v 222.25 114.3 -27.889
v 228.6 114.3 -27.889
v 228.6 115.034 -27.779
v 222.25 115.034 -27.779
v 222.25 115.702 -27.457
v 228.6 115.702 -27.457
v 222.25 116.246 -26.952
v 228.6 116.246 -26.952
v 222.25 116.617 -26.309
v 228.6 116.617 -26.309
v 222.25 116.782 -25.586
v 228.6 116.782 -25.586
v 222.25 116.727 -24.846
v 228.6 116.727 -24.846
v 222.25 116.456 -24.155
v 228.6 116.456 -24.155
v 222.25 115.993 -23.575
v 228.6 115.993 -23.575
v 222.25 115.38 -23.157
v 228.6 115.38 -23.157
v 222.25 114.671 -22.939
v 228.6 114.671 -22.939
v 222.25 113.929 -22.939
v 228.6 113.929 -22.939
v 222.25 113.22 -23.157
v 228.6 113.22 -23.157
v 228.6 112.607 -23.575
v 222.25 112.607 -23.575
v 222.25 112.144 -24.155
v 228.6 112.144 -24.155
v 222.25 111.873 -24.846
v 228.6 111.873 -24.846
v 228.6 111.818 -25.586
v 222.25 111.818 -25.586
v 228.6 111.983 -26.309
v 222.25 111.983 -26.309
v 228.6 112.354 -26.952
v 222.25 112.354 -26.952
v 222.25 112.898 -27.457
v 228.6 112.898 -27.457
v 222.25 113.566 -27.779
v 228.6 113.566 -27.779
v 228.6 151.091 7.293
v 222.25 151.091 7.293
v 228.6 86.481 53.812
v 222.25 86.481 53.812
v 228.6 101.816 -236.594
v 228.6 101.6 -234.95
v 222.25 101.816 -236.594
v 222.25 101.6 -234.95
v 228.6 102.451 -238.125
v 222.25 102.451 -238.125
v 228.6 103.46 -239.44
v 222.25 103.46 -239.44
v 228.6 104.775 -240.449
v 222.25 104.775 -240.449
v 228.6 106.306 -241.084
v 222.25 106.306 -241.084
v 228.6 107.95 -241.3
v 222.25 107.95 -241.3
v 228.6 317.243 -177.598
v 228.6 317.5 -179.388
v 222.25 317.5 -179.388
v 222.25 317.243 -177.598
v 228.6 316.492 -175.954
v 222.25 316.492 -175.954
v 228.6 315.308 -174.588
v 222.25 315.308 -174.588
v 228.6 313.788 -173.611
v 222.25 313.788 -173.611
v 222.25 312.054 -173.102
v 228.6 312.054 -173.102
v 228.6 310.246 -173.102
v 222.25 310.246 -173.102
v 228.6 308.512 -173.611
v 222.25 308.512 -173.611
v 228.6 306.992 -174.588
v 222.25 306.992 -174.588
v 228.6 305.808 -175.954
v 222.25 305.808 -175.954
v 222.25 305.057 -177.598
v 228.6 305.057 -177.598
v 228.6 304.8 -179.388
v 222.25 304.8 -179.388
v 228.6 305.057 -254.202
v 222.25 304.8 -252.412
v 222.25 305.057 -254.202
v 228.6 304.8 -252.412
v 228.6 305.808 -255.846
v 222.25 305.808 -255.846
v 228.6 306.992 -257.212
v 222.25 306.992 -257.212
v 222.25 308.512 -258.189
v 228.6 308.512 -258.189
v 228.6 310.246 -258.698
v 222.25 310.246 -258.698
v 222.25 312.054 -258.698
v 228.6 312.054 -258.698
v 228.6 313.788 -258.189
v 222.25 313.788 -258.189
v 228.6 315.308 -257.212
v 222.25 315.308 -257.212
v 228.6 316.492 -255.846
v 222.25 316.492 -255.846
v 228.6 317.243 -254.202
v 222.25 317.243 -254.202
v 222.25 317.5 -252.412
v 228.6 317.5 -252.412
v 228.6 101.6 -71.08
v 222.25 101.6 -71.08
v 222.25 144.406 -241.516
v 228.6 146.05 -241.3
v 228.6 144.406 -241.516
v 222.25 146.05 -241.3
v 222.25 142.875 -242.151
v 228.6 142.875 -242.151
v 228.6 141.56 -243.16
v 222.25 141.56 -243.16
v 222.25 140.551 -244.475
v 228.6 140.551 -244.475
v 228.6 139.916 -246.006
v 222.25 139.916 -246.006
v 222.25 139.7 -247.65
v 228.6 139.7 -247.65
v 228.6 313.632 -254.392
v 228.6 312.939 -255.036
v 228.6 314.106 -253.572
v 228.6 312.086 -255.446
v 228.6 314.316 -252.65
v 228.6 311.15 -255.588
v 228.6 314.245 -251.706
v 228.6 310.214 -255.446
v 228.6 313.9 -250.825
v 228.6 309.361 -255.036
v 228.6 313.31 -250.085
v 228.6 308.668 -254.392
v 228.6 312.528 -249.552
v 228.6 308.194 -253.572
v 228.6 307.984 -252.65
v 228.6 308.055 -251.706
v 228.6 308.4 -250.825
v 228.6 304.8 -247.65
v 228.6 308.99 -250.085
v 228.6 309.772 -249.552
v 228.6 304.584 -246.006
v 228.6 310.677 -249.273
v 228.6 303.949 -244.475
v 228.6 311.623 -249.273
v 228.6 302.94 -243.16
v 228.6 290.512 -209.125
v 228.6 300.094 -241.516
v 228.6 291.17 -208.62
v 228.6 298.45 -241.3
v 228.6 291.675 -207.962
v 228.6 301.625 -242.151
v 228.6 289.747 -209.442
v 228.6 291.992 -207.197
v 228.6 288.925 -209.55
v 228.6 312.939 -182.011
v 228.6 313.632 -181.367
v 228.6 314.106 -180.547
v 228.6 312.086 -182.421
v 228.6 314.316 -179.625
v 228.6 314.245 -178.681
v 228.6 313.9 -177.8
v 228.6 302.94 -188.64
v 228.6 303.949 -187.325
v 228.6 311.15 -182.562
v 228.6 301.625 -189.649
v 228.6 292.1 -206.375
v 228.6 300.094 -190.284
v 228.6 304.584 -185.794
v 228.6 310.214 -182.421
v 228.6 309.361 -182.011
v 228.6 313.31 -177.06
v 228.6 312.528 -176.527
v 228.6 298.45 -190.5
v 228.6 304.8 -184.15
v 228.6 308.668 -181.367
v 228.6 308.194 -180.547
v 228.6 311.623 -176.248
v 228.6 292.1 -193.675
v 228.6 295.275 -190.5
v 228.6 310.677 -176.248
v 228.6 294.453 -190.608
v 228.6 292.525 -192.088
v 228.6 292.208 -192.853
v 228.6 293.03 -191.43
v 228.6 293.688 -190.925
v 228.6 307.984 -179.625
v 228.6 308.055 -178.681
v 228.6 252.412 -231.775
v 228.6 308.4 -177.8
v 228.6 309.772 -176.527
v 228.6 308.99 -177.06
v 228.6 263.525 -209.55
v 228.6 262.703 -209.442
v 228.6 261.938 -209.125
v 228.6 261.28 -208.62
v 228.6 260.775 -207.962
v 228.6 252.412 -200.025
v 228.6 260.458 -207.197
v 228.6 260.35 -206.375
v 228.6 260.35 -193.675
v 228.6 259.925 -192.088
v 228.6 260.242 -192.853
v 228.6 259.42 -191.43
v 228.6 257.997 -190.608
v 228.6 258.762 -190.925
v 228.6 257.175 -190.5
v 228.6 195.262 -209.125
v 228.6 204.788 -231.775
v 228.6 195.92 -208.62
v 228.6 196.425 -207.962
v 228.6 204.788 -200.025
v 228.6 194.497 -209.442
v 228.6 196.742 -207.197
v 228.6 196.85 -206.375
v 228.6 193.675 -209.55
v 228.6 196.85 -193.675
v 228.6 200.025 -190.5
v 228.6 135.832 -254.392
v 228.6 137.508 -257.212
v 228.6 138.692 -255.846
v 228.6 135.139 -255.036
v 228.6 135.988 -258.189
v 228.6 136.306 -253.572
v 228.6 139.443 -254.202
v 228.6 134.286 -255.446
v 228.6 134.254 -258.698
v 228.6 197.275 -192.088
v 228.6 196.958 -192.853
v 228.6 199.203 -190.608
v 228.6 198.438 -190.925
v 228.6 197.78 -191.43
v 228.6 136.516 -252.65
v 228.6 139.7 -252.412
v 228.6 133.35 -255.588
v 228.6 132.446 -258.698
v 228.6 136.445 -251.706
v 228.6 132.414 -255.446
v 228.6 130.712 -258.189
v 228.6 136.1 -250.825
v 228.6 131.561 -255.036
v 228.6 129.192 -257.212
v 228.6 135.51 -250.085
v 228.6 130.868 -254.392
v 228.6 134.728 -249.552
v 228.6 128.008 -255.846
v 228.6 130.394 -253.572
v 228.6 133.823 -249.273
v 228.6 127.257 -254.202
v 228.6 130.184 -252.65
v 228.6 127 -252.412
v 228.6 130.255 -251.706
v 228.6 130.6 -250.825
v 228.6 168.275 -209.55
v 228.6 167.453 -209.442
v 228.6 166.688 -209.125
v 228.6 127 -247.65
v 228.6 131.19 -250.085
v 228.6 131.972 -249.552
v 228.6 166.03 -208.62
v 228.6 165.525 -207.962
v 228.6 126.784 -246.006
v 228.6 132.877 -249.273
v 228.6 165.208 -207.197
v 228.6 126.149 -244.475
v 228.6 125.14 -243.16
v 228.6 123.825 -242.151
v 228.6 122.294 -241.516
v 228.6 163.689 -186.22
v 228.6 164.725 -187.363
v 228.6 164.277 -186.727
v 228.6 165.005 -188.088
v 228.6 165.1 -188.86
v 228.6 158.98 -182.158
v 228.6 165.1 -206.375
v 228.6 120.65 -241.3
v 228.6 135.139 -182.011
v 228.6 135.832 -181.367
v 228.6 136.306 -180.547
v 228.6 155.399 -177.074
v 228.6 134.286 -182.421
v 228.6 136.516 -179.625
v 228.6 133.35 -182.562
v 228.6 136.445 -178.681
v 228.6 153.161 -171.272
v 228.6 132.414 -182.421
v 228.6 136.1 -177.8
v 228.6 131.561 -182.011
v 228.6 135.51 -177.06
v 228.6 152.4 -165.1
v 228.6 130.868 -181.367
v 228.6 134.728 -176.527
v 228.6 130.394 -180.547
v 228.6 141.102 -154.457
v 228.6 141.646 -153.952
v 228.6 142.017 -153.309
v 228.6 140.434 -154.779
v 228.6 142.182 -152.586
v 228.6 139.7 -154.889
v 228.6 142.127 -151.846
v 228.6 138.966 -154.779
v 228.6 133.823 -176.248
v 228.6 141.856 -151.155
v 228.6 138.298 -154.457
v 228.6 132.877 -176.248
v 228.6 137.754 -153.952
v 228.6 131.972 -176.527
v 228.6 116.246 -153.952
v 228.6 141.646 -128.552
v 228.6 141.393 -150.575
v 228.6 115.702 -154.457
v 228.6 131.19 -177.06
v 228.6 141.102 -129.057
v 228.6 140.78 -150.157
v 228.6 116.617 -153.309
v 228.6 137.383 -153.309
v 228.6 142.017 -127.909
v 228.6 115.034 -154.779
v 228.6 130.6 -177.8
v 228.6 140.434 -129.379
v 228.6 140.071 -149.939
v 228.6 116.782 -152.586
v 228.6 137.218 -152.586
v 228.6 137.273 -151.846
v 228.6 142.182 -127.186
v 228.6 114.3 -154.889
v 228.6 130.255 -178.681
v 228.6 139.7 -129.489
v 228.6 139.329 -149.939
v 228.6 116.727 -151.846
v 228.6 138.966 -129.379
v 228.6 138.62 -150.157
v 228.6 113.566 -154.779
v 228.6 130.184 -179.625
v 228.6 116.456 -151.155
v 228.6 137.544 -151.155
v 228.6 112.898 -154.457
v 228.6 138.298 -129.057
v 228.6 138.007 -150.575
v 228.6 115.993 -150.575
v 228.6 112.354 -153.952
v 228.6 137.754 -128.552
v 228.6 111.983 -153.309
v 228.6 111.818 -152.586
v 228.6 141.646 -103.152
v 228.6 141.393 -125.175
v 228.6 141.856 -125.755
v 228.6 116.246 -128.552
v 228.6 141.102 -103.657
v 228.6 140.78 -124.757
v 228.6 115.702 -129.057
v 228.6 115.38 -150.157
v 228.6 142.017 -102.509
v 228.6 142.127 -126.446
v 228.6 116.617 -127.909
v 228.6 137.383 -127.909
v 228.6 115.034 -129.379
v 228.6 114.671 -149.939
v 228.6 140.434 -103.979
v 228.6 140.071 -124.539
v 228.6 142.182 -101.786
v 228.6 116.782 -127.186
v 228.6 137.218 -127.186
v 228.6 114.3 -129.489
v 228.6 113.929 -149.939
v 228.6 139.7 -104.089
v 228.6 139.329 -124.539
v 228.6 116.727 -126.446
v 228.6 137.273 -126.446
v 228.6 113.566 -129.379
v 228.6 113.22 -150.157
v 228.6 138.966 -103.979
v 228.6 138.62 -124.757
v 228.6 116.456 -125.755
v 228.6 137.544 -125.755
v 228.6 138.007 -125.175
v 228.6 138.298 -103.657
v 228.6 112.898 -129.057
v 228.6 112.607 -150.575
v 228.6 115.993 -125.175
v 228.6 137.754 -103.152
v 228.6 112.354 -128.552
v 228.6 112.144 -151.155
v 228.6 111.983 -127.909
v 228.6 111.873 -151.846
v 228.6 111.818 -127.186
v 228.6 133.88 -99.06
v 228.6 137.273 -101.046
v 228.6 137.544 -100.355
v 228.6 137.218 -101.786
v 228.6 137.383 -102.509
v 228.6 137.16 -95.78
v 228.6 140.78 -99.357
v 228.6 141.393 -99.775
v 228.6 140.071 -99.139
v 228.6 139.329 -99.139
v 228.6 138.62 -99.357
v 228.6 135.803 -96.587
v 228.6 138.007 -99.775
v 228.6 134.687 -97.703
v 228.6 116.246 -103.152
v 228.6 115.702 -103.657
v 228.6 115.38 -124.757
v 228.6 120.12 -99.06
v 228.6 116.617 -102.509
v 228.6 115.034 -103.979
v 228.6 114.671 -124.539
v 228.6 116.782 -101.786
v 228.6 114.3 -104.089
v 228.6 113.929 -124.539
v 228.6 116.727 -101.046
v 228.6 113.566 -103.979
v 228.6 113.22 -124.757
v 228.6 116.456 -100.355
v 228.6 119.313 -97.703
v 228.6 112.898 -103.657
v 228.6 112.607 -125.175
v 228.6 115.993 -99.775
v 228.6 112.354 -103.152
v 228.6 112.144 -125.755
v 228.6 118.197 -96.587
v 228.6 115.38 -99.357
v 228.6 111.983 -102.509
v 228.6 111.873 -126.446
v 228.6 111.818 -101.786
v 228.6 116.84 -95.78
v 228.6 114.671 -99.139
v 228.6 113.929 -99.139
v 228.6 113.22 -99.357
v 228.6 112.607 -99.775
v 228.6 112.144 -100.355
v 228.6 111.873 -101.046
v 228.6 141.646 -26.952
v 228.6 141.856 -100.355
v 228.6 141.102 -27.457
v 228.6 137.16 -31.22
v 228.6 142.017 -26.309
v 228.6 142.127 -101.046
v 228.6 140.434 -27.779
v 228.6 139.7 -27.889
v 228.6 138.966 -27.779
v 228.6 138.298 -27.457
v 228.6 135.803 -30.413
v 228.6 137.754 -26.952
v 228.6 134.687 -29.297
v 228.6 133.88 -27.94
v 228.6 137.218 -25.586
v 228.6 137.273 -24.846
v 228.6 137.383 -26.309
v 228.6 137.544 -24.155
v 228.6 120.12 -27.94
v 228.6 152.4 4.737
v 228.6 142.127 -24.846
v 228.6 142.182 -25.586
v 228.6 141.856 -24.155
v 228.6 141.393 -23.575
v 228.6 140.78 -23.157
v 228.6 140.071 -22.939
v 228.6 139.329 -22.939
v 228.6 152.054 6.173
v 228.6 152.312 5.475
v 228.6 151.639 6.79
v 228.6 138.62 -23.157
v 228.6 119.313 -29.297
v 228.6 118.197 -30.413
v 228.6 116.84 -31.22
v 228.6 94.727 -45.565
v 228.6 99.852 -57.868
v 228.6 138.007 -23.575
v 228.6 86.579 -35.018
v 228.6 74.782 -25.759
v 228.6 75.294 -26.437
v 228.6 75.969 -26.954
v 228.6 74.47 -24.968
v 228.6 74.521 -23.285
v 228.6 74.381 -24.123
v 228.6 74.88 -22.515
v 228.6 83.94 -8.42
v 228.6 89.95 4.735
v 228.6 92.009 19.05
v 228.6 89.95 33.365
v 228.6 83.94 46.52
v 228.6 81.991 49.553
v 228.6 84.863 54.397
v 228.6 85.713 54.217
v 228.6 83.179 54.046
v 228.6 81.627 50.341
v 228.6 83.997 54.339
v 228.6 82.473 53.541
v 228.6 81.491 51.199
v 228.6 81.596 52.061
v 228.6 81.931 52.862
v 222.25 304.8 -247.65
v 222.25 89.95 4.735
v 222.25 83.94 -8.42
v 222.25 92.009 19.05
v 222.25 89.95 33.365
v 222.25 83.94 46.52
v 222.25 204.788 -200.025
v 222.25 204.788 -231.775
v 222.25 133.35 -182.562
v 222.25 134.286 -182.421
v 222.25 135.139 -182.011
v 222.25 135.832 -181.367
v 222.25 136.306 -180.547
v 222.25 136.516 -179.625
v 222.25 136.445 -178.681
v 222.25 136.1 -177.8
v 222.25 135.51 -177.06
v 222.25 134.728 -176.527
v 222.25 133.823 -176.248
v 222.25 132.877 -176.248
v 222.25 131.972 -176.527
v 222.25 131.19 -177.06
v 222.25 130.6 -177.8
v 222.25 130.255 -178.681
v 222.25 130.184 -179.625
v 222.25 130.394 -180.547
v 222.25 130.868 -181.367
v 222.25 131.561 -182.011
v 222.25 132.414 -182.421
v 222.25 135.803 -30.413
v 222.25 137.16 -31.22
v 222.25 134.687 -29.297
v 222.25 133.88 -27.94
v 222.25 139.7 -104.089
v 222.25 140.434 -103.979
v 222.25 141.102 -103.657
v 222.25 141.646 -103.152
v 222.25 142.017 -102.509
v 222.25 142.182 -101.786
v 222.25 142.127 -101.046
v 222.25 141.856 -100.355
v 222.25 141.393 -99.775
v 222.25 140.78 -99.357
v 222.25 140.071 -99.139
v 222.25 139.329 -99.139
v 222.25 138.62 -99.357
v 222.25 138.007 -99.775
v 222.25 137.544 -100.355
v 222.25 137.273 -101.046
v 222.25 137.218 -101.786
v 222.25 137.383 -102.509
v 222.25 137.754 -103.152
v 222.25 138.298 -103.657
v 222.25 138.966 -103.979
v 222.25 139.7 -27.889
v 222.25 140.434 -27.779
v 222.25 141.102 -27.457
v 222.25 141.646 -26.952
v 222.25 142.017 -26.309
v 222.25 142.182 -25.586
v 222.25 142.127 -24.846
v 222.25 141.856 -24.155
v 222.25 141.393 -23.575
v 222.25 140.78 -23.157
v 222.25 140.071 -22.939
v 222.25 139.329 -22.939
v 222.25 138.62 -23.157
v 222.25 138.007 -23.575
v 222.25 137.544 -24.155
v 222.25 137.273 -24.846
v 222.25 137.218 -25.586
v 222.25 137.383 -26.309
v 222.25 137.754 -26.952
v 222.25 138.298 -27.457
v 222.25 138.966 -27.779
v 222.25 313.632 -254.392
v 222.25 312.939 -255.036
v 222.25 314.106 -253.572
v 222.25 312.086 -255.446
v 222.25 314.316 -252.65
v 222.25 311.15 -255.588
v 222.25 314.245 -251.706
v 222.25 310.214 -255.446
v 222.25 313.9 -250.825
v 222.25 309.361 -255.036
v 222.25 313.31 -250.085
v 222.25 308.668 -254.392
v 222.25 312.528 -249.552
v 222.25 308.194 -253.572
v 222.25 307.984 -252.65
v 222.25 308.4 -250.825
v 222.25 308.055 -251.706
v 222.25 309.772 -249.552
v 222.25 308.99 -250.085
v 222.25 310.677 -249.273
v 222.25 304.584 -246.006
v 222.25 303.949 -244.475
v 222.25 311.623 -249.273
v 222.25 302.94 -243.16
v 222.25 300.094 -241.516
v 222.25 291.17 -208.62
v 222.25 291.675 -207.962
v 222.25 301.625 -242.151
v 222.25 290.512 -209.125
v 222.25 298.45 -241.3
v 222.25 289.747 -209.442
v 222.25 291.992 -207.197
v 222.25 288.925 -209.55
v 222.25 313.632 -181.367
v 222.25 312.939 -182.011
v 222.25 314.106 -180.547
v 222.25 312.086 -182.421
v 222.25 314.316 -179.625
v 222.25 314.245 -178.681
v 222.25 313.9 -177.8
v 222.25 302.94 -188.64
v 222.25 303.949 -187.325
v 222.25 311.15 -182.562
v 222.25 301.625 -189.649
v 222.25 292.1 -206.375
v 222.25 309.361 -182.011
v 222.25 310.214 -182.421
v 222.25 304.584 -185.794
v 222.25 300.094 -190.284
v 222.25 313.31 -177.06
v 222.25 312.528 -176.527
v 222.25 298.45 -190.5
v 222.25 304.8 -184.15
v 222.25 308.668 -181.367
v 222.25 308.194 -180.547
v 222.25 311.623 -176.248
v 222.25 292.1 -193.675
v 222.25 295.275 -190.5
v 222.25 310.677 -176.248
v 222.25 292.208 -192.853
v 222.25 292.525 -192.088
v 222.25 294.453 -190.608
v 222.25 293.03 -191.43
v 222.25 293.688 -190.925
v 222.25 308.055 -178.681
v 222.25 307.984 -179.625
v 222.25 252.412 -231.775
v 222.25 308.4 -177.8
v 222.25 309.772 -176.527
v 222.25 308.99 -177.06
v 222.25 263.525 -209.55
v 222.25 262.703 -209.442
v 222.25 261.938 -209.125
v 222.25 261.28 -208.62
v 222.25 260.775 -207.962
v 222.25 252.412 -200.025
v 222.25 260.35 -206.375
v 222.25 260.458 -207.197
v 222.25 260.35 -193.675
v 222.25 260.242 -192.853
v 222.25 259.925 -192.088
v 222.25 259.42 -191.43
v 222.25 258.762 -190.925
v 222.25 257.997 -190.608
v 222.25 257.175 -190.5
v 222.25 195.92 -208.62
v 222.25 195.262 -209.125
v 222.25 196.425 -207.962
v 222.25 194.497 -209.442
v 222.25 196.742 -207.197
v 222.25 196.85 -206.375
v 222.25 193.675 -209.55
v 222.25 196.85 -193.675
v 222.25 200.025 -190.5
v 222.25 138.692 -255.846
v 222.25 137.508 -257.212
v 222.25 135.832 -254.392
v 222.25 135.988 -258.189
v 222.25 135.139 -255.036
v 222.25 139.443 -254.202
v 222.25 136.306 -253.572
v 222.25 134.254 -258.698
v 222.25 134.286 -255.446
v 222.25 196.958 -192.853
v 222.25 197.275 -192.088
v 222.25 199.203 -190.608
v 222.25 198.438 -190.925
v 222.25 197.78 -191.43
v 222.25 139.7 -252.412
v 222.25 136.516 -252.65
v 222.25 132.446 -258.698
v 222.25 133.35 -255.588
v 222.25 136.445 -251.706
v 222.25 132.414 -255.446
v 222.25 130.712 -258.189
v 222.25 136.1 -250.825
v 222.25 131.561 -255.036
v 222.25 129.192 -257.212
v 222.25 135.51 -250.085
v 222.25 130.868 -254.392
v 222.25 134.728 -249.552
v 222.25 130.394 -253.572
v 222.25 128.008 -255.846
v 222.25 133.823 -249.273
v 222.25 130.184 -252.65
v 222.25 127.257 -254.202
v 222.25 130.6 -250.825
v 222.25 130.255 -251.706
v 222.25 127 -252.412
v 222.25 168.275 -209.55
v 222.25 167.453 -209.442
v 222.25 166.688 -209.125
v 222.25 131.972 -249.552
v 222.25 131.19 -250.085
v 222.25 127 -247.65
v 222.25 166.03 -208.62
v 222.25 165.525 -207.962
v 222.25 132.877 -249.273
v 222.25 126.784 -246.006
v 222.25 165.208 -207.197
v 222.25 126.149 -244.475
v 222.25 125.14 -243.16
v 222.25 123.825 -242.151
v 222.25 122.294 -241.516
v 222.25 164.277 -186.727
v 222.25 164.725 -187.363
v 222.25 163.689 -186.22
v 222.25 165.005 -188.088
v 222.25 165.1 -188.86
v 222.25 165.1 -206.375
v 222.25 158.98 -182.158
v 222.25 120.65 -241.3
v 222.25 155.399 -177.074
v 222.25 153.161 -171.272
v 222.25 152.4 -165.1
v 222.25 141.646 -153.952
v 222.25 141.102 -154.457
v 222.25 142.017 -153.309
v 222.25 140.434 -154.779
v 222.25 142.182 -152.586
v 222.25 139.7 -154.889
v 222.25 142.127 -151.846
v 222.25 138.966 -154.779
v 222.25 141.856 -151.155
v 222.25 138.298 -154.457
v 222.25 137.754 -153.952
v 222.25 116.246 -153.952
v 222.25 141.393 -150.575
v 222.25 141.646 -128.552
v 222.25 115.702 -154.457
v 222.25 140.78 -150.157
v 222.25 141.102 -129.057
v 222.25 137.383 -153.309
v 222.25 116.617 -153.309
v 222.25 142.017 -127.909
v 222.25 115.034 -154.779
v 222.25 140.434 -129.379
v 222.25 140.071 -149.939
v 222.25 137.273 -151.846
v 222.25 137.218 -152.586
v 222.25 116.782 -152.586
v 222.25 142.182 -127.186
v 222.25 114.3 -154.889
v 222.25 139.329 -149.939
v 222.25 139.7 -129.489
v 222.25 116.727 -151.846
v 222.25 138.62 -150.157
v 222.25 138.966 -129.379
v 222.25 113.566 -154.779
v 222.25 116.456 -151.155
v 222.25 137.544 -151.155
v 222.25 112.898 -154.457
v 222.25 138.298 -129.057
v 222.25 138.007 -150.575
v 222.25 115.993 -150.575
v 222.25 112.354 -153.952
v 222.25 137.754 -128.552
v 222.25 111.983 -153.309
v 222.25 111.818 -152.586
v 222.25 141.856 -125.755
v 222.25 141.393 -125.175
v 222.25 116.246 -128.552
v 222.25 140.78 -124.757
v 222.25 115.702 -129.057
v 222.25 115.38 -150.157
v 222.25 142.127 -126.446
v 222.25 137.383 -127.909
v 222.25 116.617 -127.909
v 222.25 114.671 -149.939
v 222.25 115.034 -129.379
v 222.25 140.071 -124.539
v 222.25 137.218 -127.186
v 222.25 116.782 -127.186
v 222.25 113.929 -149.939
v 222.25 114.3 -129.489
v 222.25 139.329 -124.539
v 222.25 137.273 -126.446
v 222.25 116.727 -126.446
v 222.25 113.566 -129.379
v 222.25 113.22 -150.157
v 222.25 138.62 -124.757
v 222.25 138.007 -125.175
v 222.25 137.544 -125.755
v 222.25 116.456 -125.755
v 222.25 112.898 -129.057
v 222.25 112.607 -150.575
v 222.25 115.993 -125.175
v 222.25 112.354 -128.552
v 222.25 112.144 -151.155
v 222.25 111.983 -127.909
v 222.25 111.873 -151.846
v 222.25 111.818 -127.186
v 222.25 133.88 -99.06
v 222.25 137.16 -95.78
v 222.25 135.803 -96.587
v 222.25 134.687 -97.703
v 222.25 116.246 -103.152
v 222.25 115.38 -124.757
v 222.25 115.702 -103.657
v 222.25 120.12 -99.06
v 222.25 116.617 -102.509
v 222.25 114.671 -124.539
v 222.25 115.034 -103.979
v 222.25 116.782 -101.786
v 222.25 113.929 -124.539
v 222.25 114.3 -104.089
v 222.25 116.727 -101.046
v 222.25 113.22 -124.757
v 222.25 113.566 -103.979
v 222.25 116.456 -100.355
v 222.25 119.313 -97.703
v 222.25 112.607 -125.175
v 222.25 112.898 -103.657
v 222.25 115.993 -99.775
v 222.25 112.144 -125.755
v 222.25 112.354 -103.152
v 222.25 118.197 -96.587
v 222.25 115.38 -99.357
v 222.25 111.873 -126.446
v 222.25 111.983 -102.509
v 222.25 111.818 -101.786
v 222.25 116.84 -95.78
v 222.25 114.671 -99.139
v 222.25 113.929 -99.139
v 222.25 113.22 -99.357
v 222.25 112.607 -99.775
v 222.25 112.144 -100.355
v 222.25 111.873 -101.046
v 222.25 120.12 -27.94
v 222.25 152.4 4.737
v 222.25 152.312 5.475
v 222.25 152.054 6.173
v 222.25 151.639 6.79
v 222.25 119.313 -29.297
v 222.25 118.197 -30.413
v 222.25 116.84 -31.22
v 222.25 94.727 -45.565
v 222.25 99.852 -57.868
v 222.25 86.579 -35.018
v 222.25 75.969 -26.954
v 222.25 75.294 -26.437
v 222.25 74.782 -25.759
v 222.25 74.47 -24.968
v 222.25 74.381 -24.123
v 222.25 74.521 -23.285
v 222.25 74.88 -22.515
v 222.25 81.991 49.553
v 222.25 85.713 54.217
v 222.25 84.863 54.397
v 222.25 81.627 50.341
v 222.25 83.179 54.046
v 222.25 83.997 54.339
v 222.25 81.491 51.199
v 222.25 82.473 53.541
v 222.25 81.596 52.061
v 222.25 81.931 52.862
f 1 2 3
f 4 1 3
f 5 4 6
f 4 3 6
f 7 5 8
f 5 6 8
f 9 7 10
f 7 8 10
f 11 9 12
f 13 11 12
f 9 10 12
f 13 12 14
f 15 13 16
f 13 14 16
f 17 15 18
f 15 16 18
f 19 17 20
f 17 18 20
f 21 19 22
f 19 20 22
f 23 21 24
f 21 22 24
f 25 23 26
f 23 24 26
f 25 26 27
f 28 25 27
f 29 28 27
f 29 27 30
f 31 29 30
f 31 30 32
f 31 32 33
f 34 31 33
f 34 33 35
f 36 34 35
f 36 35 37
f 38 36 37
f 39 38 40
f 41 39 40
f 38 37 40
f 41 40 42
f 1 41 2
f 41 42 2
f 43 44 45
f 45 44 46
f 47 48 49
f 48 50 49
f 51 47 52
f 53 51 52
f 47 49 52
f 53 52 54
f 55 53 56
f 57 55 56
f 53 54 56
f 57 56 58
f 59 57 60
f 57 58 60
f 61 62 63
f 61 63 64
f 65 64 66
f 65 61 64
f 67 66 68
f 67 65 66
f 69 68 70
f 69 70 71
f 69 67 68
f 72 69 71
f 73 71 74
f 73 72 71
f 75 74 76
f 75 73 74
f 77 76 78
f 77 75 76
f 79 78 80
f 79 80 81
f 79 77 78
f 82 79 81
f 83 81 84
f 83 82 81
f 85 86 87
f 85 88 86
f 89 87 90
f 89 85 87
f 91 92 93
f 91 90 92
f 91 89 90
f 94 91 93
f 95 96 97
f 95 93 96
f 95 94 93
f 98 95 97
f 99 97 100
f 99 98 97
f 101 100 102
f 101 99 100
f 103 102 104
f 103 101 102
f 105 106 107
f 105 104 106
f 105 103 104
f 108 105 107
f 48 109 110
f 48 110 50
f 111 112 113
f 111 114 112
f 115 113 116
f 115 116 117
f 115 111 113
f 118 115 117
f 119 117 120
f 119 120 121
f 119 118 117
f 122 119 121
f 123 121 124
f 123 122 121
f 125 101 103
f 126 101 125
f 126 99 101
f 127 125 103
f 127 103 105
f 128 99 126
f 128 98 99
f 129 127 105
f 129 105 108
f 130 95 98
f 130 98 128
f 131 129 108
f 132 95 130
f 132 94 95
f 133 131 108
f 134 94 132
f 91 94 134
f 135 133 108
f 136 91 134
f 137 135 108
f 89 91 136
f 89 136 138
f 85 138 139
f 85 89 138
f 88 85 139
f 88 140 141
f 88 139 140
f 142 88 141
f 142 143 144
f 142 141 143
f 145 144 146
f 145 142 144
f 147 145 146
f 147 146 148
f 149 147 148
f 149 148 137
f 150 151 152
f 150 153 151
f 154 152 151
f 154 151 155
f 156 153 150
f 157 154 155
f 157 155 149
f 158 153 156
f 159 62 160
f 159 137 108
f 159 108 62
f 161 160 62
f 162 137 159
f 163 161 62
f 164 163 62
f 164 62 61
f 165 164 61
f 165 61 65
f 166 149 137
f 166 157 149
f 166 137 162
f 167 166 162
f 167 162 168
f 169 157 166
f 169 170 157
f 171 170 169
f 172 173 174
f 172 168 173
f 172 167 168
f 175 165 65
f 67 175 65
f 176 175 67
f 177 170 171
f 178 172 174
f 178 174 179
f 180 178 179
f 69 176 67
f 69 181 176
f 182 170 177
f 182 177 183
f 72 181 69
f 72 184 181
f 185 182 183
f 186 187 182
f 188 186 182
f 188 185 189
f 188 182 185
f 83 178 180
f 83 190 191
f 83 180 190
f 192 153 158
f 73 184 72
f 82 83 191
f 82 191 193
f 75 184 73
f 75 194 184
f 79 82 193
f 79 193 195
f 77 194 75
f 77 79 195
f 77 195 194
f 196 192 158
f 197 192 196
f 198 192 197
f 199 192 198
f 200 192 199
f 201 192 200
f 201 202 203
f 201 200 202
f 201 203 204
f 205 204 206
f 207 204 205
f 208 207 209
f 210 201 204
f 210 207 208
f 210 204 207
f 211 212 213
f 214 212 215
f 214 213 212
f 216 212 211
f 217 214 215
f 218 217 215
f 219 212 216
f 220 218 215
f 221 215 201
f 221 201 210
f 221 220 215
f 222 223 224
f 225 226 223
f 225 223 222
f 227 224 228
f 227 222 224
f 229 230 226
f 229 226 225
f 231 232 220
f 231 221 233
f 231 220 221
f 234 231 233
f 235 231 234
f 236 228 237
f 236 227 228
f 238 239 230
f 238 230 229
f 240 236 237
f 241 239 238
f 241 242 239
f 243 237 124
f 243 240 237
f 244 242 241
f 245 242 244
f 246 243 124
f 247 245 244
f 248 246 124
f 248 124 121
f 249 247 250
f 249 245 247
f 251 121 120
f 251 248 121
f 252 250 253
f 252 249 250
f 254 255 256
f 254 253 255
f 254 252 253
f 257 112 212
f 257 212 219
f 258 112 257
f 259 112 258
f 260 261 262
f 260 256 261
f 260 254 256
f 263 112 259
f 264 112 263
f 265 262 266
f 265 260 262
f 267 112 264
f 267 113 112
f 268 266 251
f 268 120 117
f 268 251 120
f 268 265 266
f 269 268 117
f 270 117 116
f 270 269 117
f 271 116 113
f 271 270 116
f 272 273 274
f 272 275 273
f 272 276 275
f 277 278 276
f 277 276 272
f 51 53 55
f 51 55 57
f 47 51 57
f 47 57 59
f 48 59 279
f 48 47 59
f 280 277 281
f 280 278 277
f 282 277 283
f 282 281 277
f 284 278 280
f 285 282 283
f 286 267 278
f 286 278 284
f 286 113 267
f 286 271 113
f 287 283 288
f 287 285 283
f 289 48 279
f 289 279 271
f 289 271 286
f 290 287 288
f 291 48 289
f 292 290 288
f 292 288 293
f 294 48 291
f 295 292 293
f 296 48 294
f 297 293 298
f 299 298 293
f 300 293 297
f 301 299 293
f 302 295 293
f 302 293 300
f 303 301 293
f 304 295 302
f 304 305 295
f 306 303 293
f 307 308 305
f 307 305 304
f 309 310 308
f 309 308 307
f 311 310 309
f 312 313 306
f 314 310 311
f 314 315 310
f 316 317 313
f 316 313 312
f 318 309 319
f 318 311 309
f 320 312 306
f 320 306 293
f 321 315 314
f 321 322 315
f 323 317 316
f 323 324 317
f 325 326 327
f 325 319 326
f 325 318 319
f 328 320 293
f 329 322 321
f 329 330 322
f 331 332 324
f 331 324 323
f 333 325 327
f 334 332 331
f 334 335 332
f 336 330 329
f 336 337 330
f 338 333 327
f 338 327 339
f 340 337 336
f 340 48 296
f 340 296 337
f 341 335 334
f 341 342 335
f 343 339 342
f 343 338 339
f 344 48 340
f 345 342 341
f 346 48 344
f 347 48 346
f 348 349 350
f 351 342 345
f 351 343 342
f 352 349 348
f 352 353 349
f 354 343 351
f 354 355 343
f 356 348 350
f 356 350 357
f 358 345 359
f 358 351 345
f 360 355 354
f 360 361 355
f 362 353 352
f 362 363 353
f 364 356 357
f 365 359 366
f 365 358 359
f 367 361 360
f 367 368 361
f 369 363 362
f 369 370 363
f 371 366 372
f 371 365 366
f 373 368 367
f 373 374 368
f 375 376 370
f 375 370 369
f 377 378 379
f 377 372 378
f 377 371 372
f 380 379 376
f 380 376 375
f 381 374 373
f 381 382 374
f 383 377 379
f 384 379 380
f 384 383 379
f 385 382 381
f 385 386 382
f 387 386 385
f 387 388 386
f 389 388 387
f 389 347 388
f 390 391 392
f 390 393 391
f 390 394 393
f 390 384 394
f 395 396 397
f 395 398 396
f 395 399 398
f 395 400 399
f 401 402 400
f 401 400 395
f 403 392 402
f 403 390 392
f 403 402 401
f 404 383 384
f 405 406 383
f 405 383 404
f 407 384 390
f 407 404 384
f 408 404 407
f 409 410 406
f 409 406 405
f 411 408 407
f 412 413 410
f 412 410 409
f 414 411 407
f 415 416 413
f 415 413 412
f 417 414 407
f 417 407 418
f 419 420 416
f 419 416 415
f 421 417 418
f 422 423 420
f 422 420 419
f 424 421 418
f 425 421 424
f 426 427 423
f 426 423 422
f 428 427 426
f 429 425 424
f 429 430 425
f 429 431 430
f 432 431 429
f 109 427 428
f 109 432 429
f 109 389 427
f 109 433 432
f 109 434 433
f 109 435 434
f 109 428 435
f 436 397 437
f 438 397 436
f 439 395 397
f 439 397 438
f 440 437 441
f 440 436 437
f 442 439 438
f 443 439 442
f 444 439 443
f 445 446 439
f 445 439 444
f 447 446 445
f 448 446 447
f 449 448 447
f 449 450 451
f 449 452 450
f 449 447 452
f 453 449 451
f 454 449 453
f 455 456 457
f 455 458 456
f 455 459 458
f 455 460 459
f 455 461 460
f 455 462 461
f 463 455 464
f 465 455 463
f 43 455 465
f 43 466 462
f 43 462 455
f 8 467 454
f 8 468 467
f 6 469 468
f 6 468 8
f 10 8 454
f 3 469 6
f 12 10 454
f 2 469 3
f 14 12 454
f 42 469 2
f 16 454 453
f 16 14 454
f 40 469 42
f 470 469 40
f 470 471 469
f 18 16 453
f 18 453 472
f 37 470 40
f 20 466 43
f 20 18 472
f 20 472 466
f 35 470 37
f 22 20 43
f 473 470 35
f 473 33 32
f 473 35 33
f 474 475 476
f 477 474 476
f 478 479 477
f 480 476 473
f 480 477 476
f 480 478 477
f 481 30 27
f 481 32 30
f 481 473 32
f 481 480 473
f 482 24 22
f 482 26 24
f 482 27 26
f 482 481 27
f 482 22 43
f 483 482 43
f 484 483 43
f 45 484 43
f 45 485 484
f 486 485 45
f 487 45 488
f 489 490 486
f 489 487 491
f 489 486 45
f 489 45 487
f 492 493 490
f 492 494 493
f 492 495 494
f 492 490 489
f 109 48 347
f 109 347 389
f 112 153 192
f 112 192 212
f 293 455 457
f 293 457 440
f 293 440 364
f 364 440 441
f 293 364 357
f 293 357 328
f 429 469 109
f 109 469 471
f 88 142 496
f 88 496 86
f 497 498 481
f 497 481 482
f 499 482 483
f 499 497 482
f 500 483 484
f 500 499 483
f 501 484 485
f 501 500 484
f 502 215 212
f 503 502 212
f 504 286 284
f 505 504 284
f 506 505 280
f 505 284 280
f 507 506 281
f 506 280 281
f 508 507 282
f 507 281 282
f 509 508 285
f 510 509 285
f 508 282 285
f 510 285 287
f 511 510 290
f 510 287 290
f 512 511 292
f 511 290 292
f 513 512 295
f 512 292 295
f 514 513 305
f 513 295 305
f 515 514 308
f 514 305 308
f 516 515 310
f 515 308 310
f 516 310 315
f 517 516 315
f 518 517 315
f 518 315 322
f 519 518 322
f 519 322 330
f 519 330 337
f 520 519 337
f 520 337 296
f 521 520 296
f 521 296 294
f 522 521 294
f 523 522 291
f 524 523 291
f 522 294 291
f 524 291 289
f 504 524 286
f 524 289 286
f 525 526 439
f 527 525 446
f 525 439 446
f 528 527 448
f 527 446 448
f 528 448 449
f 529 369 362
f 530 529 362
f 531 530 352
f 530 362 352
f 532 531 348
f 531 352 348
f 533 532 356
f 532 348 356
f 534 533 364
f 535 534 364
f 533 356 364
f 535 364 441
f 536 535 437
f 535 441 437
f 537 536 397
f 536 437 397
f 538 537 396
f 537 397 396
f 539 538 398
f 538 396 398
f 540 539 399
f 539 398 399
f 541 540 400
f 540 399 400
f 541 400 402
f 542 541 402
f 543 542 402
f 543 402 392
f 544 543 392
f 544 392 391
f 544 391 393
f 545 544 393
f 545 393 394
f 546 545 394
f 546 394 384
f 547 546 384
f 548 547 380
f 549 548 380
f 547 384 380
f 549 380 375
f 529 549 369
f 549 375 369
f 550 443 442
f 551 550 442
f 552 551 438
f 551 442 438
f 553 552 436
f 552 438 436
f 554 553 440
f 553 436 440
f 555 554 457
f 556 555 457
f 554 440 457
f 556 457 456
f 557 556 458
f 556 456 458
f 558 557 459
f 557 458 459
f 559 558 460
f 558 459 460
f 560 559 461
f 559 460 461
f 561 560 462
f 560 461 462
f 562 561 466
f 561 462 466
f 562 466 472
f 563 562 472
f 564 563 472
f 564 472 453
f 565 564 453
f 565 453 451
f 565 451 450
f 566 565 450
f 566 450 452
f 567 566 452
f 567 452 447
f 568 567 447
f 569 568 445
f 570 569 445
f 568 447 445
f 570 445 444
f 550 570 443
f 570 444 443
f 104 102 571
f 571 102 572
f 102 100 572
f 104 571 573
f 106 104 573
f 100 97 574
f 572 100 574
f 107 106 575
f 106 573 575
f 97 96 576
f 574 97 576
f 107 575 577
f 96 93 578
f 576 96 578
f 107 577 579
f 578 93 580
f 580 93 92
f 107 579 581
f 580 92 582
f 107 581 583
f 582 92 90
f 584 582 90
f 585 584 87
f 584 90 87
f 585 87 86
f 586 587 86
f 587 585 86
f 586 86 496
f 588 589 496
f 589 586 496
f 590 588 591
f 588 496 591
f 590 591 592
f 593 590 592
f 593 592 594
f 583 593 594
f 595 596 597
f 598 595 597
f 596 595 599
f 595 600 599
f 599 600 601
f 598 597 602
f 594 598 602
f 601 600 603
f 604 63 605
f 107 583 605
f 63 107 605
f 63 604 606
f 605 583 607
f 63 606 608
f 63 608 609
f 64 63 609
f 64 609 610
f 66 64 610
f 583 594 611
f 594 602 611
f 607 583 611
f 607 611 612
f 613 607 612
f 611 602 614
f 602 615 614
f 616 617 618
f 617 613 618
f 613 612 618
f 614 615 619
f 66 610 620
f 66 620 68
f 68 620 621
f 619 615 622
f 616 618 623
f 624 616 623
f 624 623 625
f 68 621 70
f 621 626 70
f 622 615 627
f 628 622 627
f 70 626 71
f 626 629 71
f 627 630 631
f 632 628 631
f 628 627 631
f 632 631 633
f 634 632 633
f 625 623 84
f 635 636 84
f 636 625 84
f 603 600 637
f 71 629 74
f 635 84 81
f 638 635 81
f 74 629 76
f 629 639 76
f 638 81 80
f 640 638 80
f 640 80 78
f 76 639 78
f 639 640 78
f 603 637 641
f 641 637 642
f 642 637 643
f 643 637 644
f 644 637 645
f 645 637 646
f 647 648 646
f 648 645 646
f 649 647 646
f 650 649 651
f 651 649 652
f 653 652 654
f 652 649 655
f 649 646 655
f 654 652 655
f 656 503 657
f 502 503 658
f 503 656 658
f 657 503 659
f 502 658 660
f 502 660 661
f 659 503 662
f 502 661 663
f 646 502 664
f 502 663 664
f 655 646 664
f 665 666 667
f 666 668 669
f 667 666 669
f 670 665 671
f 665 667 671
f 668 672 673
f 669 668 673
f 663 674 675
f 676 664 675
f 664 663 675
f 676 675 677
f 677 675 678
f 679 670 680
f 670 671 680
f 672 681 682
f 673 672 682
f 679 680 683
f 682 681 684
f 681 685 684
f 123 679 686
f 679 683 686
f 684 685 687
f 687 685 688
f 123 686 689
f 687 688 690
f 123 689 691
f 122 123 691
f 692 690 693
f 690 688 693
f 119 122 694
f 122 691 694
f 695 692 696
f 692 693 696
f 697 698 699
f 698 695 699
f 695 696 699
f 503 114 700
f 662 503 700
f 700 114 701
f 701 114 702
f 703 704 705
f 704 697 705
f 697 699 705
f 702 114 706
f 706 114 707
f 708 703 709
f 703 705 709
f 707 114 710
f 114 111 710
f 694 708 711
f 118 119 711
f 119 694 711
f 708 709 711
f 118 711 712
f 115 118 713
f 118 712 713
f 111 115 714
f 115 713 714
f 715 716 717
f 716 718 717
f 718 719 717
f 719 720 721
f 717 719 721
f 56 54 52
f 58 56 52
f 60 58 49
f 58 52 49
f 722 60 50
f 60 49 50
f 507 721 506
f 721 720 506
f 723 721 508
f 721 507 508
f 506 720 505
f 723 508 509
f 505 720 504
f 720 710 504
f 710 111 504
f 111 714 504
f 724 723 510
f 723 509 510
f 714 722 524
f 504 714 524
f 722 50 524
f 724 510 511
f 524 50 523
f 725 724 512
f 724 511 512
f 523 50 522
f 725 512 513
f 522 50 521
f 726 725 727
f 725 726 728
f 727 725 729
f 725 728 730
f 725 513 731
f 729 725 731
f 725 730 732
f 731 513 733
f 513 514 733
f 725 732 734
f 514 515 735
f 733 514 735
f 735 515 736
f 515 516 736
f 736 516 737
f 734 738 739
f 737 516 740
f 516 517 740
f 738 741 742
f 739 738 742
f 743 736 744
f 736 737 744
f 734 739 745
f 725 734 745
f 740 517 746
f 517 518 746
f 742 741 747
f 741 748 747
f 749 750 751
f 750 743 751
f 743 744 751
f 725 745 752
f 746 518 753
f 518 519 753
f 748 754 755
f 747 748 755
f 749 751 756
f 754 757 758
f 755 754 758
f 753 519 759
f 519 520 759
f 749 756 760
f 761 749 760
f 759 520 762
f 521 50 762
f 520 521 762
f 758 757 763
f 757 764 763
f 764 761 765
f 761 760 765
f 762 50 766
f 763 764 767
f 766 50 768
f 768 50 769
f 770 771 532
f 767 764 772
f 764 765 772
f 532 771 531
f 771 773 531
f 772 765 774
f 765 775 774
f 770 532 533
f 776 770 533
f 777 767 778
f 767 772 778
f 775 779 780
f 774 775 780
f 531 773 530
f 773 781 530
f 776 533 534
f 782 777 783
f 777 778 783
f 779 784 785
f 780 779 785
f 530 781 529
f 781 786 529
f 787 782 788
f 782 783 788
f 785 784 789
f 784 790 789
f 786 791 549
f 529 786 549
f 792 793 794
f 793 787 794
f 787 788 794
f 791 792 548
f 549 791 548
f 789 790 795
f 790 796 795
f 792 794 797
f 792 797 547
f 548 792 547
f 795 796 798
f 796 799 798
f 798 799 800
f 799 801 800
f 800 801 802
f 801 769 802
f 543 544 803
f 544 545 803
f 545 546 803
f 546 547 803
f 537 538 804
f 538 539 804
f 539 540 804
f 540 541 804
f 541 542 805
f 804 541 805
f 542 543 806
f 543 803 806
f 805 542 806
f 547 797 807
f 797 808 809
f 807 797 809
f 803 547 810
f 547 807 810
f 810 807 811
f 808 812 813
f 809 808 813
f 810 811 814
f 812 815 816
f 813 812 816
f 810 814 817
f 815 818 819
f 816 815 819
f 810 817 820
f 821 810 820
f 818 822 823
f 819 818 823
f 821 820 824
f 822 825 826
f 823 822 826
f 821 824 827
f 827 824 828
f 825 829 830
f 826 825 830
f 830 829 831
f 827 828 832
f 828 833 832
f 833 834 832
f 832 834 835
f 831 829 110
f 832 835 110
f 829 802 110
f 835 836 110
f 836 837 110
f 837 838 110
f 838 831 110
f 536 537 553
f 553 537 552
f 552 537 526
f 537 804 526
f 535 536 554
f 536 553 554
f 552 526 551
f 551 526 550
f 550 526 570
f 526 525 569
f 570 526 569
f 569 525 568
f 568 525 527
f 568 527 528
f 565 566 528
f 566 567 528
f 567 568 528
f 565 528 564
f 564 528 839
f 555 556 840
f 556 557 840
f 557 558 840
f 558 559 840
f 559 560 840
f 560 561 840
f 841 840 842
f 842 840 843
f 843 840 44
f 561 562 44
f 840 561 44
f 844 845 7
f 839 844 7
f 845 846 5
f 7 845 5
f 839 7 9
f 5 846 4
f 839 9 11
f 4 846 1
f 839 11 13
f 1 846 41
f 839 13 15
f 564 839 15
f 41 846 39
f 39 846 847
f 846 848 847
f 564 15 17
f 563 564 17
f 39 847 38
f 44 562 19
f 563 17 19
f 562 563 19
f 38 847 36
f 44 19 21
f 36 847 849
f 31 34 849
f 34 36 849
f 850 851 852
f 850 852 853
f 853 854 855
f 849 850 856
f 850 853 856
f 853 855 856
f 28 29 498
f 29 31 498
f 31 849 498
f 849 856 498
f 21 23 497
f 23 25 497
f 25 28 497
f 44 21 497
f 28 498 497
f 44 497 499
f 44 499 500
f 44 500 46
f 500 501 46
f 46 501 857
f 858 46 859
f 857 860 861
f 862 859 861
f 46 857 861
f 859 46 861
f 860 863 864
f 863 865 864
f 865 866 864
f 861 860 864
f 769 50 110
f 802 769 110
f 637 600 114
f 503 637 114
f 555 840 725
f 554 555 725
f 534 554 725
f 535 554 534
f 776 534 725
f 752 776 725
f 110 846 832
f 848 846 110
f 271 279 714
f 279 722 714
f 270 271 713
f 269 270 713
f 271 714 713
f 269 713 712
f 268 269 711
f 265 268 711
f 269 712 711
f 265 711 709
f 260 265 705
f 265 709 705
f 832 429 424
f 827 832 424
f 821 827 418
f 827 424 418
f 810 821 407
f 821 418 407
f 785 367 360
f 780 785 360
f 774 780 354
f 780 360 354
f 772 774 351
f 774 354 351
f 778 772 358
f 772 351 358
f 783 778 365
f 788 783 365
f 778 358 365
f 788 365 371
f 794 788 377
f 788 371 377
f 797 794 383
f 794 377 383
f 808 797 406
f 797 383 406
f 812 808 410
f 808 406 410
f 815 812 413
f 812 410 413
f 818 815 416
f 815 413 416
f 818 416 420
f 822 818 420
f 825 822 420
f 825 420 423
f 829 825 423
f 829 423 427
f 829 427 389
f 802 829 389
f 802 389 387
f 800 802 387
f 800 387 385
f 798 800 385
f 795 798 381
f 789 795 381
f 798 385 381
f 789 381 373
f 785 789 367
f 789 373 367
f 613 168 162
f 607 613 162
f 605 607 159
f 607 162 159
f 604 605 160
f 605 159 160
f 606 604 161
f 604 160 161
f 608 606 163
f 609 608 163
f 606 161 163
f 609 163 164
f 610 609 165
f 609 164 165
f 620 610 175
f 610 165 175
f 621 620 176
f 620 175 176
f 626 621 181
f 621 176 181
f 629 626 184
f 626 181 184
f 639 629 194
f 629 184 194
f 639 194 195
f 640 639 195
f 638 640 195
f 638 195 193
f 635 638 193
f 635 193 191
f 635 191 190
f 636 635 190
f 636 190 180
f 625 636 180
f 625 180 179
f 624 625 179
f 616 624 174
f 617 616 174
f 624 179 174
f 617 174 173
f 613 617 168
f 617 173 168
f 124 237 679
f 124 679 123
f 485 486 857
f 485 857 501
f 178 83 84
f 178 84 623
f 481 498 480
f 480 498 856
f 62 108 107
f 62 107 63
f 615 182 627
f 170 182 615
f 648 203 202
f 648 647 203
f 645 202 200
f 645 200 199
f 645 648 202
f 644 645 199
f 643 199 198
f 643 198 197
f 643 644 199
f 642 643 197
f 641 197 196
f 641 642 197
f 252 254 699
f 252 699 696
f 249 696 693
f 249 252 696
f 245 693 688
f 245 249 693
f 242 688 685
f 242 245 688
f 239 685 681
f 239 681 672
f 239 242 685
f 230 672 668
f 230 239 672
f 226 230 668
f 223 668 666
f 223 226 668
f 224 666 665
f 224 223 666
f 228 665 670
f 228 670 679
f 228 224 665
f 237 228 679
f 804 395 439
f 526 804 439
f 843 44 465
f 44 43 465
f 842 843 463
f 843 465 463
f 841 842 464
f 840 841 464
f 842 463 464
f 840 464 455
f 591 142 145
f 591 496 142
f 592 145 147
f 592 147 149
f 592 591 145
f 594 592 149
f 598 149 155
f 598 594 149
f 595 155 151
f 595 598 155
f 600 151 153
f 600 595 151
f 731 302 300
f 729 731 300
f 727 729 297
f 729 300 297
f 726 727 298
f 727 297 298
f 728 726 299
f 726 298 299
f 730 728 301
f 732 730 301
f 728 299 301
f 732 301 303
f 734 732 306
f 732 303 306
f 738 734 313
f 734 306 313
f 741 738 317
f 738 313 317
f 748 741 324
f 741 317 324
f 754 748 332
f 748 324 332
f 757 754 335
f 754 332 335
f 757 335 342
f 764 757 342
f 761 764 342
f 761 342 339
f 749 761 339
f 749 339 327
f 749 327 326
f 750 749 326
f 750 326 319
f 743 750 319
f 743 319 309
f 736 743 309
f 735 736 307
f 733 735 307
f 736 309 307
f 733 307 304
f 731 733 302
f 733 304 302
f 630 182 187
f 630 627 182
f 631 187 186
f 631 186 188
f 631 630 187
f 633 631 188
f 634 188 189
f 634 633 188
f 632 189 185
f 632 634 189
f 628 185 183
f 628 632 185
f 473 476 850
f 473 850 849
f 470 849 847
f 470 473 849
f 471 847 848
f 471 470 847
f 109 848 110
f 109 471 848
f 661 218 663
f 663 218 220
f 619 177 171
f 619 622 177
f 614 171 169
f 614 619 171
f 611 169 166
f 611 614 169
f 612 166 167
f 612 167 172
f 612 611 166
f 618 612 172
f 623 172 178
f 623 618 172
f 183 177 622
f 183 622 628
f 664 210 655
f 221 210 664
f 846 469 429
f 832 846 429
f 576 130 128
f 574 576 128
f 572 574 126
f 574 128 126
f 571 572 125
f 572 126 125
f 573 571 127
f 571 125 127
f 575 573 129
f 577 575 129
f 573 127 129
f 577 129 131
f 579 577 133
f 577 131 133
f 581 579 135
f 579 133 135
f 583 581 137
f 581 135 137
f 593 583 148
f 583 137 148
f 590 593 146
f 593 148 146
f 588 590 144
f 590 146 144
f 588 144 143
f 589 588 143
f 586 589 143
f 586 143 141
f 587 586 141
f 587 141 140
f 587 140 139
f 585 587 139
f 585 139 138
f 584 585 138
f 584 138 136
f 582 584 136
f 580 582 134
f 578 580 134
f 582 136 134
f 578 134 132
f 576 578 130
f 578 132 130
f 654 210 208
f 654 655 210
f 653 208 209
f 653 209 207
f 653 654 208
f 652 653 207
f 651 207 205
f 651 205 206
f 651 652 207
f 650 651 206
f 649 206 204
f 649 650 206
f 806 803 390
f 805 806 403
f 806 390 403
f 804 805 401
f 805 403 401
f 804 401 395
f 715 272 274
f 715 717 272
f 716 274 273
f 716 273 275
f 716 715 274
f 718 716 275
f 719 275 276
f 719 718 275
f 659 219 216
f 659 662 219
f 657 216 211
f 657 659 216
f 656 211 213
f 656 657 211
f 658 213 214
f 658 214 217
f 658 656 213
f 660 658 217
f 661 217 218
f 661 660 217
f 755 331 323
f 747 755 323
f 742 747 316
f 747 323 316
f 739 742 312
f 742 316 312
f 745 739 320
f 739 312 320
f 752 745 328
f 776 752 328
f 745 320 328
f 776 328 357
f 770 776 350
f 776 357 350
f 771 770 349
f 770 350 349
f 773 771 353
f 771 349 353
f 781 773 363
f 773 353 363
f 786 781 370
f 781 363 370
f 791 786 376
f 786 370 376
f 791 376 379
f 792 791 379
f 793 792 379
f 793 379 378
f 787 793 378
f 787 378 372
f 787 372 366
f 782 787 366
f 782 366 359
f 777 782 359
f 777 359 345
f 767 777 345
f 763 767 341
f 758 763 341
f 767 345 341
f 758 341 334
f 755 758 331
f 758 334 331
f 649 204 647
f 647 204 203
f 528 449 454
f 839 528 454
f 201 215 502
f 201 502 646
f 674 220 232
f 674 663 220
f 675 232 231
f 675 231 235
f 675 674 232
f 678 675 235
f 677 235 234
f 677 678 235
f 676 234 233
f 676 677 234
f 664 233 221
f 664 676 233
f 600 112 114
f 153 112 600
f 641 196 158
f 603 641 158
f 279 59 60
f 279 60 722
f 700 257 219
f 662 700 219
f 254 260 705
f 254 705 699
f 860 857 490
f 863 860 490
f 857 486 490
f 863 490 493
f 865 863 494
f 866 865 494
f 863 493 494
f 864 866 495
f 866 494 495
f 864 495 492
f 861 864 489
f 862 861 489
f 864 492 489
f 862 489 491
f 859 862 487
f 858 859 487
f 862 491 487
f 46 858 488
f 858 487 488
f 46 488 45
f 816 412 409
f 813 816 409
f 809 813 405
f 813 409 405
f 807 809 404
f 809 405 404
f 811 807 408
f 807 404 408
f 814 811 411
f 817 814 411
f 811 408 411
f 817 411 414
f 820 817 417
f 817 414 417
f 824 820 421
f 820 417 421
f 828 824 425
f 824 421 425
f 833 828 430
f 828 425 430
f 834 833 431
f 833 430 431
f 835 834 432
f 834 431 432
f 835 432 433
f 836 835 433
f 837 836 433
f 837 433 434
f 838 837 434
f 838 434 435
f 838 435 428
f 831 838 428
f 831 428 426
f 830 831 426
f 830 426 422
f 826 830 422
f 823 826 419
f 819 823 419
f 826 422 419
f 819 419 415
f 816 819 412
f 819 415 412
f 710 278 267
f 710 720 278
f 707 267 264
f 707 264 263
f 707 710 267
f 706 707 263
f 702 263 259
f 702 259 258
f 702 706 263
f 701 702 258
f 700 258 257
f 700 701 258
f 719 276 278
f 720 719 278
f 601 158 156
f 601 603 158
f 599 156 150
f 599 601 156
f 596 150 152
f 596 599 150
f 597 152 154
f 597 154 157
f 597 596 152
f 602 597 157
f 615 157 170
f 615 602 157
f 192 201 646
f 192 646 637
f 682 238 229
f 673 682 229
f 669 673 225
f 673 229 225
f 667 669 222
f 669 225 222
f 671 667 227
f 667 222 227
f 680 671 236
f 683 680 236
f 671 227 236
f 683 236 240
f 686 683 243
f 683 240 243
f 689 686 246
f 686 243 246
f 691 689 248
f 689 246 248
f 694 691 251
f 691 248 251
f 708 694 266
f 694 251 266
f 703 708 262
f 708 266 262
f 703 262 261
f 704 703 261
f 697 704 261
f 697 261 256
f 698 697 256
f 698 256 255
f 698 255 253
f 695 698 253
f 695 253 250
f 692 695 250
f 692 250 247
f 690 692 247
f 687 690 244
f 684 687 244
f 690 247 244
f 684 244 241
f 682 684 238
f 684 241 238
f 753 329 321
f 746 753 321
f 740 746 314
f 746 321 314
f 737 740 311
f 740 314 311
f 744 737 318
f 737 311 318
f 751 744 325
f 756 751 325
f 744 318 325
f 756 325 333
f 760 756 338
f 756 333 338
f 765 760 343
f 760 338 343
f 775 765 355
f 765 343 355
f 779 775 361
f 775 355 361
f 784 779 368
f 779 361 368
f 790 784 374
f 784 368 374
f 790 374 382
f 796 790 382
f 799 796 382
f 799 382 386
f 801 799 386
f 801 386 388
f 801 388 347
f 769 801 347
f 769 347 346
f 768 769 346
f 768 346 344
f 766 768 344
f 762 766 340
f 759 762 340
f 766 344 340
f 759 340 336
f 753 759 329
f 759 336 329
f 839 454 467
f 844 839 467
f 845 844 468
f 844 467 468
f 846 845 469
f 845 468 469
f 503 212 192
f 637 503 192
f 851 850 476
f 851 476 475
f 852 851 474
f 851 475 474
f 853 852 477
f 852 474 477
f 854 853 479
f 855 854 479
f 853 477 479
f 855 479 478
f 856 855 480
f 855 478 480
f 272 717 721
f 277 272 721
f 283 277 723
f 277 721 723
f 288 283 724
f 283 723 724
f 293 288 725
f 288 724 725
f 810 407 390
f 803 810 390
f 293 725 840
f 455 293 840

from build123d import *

# Parameters (mm, degrees)
SKETCH2_R           = 2.4892
SKETCH2_R_2         = 3.175
SKETCH2_R_3         = 6.35
BOSS_EXTRUDE1_DEPTH = 6.35
FILLET1_R           = 25.4
FILLET2_R           = 6.35
FILLET3_R           = 12.7
SKETCH3_W           = 19.05
SKETCH3_H           = 31.75
CUT_EXTRUDE1_DEPTH  = 410.639602463
FILLET4_R           = 3.175
BOSS_EXTRUDE2_START = -6.35
BOSS_EXTRUDE2_DEPTH = 6.35
FILLET5_R           = 50.8
FILLET6_R           = 3.1496
SKETCH5_W           = 31.75
SKETCH5_H           = 47.625
CUT_EXTRUDE2_DEPTH  = 410.639602463


with BuildPart() as part:
    # Sketch2 → Boss-Extrude1 (new body)
    # profile 1 of 8: a face of its own
    with BuildSketch(Plane(origin=(228.6, 0, 0), x_dir=(0, 0, -1), z_dir=(1, 0, 0))):
        Polygon((190.5, 152.4), (12.7, 152.4), (12.7, 101.6), (241.3, 101.6), (241.3, 127), (241.3, 139.7), (241.3, 152.4), align=None)
        with Locations((25.4, 114.3)):
            Circle(SKETCH2_R, mode=Mode.SUBTRACT)
        with Locations((25.4, 139.7)):
            Circle(SKETCH2_R, mode=Mode.SUBTRACT)
        with Locations((101.6, 114.3)):
            Circle(SKETCH2_R, mode=Mode.SUBTRACT)
        with Locations((127, 114.3)):
            Circle(SKETCH2_R, mode=Mode.SUBTRACT)
        with Locations((101.6, 139.7)):
            Circle(SKETCH2_R, mode=Mode.SUBTRACT)
        with Locations((127, 139.7)):
            Circle(SKETCH2_R, mode=Mode.SUBTRACT)
        with Locations((152.4, 114.3)):
            Circle(SKETCH2_R, mode=Mode.SUBTRACT)
        with Locations((152.4, 139.7)):
            Circle(SKETCH2_R, mode=Mode.SUBTRACT)
        with Locations((179.3875, 133.35)):
            Circle(SKETCH2_R_2, mode=Mode.SUBTRACT)
    # profile 2 of 8: a face of its own
    with BuildSketch(Plane(origin=(228.6, 0, 0), x_dir=(0, 0, -1), z_dir=(1, 0, 0))):
        Polygon((190.5, 304.8), (190.5, 152.4), (241.3, 152.4), (241.3, 304.8), (241.3, 317.5), (190.5, 317.5), align=None)
    # profile 3 of 8: a face of its own
    with BuildSketch(Plane(origin=(228.6, 0, 0), x_dir=(0, 0, -1), z_dir=(1, 0, 0))):
        with BuildLine():
            Line((179.3875, 304.8), (190.5, 304.8))
            Line((190.5, 304.8), (190.5, 317.5))
            Line((190.5, 317.5), (179.3875, 317.5))
            ThreePointArc((179.3875, 317.5), (183.877628061, 315.640128061), (185.7375, 311.15))
            ThreePointArc((185.7375, 311.15), (183.877628061, 306.659871939), (179.3875, 304.8))
        make_face()
    # profile 4 of 8: a face of its own
    with BuildSketch(Plane(origin=(228.6, 0, 0), x_dir=(0, 0, -1), z_dir=(1, 0, 0))):
        with Locations((179.3875, 311.15)):
            Circle(SKETCH2_R_3)
        with Locations((179.3875, 311.15)):
            Circle(SKETCH2_R_2, mode=Mode.SUBTRACT)
    # profile 5 of 8: a face of its own
    with BuildSketch(Plane(origin=(228.6, 0, 0), x_dir=(0, 0, -1), z_dir=(1, 0, 0))):
        with Locations((252.4125, 311.15)):
            Circle(SKETCH2_R_3)
        with Locations((252.4125, 311.15)):
            Circle(SKETCH2_R_2, mode=Mode.SUBTRACT)
    # profile 6 of 8: a face of its own
    with BuildSketch(Plane(origin=(228.6, 0, 0), x_dir=(0, 0, -1), z_dir=(1, 0, 0))):
        with BuildLine():
            Line((241.3, 317.5), (241.3, 304.8))
            Line((241.3, 304.8), (252.4125, 304.8))
            ThreePointArc((252.4125, 304.8), (246.0625, 311.15), (252.4125, 317.5))
            Line((252.4125, 317.5), (241.3, 317.5))
        make_face()
    # profile 7 of 8: a face of its own
    with BuildSketch(Plane(origin=(228.6, 0, 0), x_dir=(0, 0, -1), z_dir=(1, 0, 0))):
        with BuildLine():
            Line((252.4125, 139.7), (241.3, 139.7))
            Line((241.3, 139.7), (241.3, 127))
            Line((241.3, 127), (252.4125, 127))
            ThreePointArc((252.4125, 127), (246.0625, 133.35), (252.4125, 139.7))
        make_face()
    # profile 8 of 8: a face of its own
    with BuildSketch(Plane(origin=(228.6, 0, 0), x_dir=(0, 0, -1), z_dir=(1, 0, 0))):
        with Locations((252.4125, 133.35)):
            Circle(SKETCH2_R_3)
        with Locations((252.4125, 133.35)):
            Circle(SKETCH2_R_2, mode=Mode.SUBTRACT)
    extrude(amount=-BOSS_EXTRUDE1_DEPTH)

    # Fillet1
    fillet1_edges = [part.edges().sort_by_distance(p)[0] for p in [
        (225.425, 152.4, -190.5),
    ]]
    fillet(fillet1_edges, radius=FILLET1_R)

    # Fillet2
    fillet2_edges = [part.edges().sort_by_distance(p)[0] for p in [
        (225.425, 139.7, -241.3),
        (225.425, 127, -241.3),
        (225.425, 101.6, -241.3),
        (225.425, 304.8, -190.5),
        (225.425, 304.8, -241.3),
    ]]
    fillet(fillet2_edges, radius=FILLET2_R)

    # Fillet3
    fillet3_edges = [part.edges().sort_by_distance(p)[0] for p in [
        (225.425, 101.6, -12.7),
        (225.425, 152.4, -12.7),
    ]]
    fillet(fillet3_edges, radius=FILLET3_R)

    # Sketch3 → Cut-Extrude1 (cut, through all)
    with BuildSketch(Plane(origin=(228.6, 0, 0), x_dir=(0, 0, -1), z_dir=(1, 0, 0))):
        with BuildLine():
            Line((190.5, 177.8), (190.5, 190.18276047))
            Line((190.5, 190.18276047), (98.023677914, 190.18276047))
            Line((98.023677914, 190.18276047), (98.023677914, 165.1))
            Line((98.023677914, 165.1), (187.097045256, 165.1))
            ThreePointArc((187.097045256, 165.1), (189.634515988, 171.225996254), (190.5, 177.8))
        make_face()
        with Locations((200.025, 276.225)):
            Rectangle(SKETCH3_W, SKETCH3_H)
        with BuildLine():
            Line((190.5, 165.1), (190.5, 177.8))
            ThreePointArc((190.5, 177.8), (189.634515988, 171.225996254), (187.097045256, 165.1))
            Line((187.097045256, 165.1), (190.5, 165.1))
        make_face()
        Polygon((209.55, 196.85), (190.5, 196.85), (190.5, 190.18276047), (190.5, 177.8), (190.5, 165.1), (209.55, 165.1), align=None)
    extrude(amount=-CUT_EXTRUDE1_DEPTH, mode=Mode.SUBTRACT)

    # Fillet4
    fillet4_edges = [part.edges().sort_by_distance(p)[0] for p in [
        (225.425, 165.1, -187.097045256),
        (225.425, 292.1, -190.5),
        (225.425, 292.1, -209.55),
        (225.425, 260.35, -209.55),
        (225.425, 260.35, -190.5),
        (225.425, 165.1, -209.55),
        (225.425, 196.85, -190.5),
        (225.425, 196.85, -209.55),
    ]]
    fillet(fillet4_edges, radius=FILLET4_R)

    # Sketch4 → Boss-Extrude2 (add)
    with BuildSketch(Plane(origin=(228.6, 0, 0), x_dir=(0, 0, -1), z_dir=(1, 0, 0)).offset(BOSS_EXTRUDE2_START)):
        with BuildLine():
            Line((-6.35, 152.4), (-63.5, 73.025))
            Line((-63.5, 73.025), (-19.05, 101.6))
            Line((-19.05, 101.6), (25.4, 73.025))
            Line((25.4, 73.025), (25.4, 101.6))
            ThreePointArc((25.4, 101.6), (16.419743879, 105.319743879), (12.7, 114.3))
            Line((12.7, 114.3), (12.7, 139.7))
            ThreePointArc((12.7, 139.7), (16.419743879, 148.680256121), (25.4, 152.4))
            Line((25.4, 152.4), (-6.35, 152.4))
        make_face()
    extrude(amount=BOSS_EXTRUDE2_DEPTH)

    # Fillet5
    # the kernel refuses this fillet: 50.8 mm, written as the material it adds along each edge
    with BuildSketch(Plane(origin=(222.25, 101.6, 19.05), x_dir=(0, -0.5407575913134988, -0.8411784753765537), z_dir=(1, 0, 0))) as fillet5_piece_1:
        with BuildLine():
            CenterArc((FILLET5_R * 0.642857142857, -FILLET5_R), FILLET5_R, 90, 65.470452544)
            Line((-FILLET5_R * 0.266890149562, -FILLET5_R * 0.584837545126), (-FILLET5_R * 0.28508509541, -FILLET5_R * 0.576534296029))
            Line((-FILLET5_R * 0.28508509541, -FILLET5_R * 0.576534296029), (-FILLET5_R * 0.0128571428571, FILLET5_R * 0.02))
            Line((-FILLET5_R * 0.0128571428571, FILLET5_R * 0.02), (FILLET5_R * 0.642857142857, FILLET5_R * 0.02))
            Line((FILLET5_R * 0.642857142857, FILLET5_R * 0.02), (FILLET5_R * 0.642857142857, 0))
        make_face()
    extrude(amount=6.35)
    with BuildSketch(Plane(origin=(228.6, 101.6, -25.4), x_dir=(0, 0, -1), z_dir=(-1, 0, 0))) as fillet5_piece_2_section:
        with BuildLine():
            CenterArc((45.68029526, 50.8), FILLET5_R, 205.944479772, 64.055520228)
            Line((0, 28.575), (-0.913605905, 28.1305))
            ThreePointArc((-0.913605905, 28.1305), (-1.016, 14.2875), (-1.016, 0))
            Line((-1.016, 0), (0, -1.016))
            Line((0, -1.016), (45.68029526, -1.016))
            Line((45.68029526, -1.016), (45.68029526, 0))
        make_face()
    fillet5_piece_2 = extrude(amount=6.35, mode=Mode.PRIVATE)
    fillet5_piece_2 = split(fillet5_piece_2, bisect_by=Plane(origin=(225.425, 74.109510014, -23.712984423), z_dir=(0, 0.8411784753765535, -0.5407575913134988)), keep=Keep.TOP, mode=Mode.PRIVATE)
    add(fillet5_piece_2)

    # Fillet6
    fillet6_edges = [part.edges().sort_by_distance(p)[0] for p in [
        (225.425, 73.025, -25.4),
        (225.425, 73.025, 63.5),
        (225.425, 152.4, 6.35),
    ]]
    fillet(fillet6_edges, radius=FILLET6_R)

    # Sketch5 → Cut-Extrude2 (cut, through all)
    with BuildSketch(Plane(origin=(228.6, 0, 0), x_dir=(0, 0, -1), z_dir=(1, 0, 0))):
        with Locations((215.9, 228.6)):
            Rectangle(SKETCH5_W, SKETCH5_H)
        with BuildLine():
            ThreePointArc((99.06, 133.880128867), (97.109871939, 135.209871939), (95.780128867, 137.16))
            Line((95.780128867, 137.16), (31.219871133, 137.16))
            ThreePointArc((31.219871133, 137.16), (29.890128061, 135.209871939), (27.94, 133.880128867))
            Line((27.94, 133.880128867), (27.94, 120.119871133))
            ThreePointArc((27.94, 120.119871133), (29.890128061, 118.790128061), (31.219871133, 116.84))
            Line((31.219871133, 116.84), (95.780128867, 116.84))
            ThreePointArc((95.780128867, 116.84), (97.109871939, 118.790128061), (99.06, 120.119871133))
            Line((99.06, 120.119871133), (99.06, 133.880128867))
        make_face()
    extrude(amount=-CUT_EXTRUDE2_DEPTH, mode=Mode.SUBTRACT)


solid = part.part
